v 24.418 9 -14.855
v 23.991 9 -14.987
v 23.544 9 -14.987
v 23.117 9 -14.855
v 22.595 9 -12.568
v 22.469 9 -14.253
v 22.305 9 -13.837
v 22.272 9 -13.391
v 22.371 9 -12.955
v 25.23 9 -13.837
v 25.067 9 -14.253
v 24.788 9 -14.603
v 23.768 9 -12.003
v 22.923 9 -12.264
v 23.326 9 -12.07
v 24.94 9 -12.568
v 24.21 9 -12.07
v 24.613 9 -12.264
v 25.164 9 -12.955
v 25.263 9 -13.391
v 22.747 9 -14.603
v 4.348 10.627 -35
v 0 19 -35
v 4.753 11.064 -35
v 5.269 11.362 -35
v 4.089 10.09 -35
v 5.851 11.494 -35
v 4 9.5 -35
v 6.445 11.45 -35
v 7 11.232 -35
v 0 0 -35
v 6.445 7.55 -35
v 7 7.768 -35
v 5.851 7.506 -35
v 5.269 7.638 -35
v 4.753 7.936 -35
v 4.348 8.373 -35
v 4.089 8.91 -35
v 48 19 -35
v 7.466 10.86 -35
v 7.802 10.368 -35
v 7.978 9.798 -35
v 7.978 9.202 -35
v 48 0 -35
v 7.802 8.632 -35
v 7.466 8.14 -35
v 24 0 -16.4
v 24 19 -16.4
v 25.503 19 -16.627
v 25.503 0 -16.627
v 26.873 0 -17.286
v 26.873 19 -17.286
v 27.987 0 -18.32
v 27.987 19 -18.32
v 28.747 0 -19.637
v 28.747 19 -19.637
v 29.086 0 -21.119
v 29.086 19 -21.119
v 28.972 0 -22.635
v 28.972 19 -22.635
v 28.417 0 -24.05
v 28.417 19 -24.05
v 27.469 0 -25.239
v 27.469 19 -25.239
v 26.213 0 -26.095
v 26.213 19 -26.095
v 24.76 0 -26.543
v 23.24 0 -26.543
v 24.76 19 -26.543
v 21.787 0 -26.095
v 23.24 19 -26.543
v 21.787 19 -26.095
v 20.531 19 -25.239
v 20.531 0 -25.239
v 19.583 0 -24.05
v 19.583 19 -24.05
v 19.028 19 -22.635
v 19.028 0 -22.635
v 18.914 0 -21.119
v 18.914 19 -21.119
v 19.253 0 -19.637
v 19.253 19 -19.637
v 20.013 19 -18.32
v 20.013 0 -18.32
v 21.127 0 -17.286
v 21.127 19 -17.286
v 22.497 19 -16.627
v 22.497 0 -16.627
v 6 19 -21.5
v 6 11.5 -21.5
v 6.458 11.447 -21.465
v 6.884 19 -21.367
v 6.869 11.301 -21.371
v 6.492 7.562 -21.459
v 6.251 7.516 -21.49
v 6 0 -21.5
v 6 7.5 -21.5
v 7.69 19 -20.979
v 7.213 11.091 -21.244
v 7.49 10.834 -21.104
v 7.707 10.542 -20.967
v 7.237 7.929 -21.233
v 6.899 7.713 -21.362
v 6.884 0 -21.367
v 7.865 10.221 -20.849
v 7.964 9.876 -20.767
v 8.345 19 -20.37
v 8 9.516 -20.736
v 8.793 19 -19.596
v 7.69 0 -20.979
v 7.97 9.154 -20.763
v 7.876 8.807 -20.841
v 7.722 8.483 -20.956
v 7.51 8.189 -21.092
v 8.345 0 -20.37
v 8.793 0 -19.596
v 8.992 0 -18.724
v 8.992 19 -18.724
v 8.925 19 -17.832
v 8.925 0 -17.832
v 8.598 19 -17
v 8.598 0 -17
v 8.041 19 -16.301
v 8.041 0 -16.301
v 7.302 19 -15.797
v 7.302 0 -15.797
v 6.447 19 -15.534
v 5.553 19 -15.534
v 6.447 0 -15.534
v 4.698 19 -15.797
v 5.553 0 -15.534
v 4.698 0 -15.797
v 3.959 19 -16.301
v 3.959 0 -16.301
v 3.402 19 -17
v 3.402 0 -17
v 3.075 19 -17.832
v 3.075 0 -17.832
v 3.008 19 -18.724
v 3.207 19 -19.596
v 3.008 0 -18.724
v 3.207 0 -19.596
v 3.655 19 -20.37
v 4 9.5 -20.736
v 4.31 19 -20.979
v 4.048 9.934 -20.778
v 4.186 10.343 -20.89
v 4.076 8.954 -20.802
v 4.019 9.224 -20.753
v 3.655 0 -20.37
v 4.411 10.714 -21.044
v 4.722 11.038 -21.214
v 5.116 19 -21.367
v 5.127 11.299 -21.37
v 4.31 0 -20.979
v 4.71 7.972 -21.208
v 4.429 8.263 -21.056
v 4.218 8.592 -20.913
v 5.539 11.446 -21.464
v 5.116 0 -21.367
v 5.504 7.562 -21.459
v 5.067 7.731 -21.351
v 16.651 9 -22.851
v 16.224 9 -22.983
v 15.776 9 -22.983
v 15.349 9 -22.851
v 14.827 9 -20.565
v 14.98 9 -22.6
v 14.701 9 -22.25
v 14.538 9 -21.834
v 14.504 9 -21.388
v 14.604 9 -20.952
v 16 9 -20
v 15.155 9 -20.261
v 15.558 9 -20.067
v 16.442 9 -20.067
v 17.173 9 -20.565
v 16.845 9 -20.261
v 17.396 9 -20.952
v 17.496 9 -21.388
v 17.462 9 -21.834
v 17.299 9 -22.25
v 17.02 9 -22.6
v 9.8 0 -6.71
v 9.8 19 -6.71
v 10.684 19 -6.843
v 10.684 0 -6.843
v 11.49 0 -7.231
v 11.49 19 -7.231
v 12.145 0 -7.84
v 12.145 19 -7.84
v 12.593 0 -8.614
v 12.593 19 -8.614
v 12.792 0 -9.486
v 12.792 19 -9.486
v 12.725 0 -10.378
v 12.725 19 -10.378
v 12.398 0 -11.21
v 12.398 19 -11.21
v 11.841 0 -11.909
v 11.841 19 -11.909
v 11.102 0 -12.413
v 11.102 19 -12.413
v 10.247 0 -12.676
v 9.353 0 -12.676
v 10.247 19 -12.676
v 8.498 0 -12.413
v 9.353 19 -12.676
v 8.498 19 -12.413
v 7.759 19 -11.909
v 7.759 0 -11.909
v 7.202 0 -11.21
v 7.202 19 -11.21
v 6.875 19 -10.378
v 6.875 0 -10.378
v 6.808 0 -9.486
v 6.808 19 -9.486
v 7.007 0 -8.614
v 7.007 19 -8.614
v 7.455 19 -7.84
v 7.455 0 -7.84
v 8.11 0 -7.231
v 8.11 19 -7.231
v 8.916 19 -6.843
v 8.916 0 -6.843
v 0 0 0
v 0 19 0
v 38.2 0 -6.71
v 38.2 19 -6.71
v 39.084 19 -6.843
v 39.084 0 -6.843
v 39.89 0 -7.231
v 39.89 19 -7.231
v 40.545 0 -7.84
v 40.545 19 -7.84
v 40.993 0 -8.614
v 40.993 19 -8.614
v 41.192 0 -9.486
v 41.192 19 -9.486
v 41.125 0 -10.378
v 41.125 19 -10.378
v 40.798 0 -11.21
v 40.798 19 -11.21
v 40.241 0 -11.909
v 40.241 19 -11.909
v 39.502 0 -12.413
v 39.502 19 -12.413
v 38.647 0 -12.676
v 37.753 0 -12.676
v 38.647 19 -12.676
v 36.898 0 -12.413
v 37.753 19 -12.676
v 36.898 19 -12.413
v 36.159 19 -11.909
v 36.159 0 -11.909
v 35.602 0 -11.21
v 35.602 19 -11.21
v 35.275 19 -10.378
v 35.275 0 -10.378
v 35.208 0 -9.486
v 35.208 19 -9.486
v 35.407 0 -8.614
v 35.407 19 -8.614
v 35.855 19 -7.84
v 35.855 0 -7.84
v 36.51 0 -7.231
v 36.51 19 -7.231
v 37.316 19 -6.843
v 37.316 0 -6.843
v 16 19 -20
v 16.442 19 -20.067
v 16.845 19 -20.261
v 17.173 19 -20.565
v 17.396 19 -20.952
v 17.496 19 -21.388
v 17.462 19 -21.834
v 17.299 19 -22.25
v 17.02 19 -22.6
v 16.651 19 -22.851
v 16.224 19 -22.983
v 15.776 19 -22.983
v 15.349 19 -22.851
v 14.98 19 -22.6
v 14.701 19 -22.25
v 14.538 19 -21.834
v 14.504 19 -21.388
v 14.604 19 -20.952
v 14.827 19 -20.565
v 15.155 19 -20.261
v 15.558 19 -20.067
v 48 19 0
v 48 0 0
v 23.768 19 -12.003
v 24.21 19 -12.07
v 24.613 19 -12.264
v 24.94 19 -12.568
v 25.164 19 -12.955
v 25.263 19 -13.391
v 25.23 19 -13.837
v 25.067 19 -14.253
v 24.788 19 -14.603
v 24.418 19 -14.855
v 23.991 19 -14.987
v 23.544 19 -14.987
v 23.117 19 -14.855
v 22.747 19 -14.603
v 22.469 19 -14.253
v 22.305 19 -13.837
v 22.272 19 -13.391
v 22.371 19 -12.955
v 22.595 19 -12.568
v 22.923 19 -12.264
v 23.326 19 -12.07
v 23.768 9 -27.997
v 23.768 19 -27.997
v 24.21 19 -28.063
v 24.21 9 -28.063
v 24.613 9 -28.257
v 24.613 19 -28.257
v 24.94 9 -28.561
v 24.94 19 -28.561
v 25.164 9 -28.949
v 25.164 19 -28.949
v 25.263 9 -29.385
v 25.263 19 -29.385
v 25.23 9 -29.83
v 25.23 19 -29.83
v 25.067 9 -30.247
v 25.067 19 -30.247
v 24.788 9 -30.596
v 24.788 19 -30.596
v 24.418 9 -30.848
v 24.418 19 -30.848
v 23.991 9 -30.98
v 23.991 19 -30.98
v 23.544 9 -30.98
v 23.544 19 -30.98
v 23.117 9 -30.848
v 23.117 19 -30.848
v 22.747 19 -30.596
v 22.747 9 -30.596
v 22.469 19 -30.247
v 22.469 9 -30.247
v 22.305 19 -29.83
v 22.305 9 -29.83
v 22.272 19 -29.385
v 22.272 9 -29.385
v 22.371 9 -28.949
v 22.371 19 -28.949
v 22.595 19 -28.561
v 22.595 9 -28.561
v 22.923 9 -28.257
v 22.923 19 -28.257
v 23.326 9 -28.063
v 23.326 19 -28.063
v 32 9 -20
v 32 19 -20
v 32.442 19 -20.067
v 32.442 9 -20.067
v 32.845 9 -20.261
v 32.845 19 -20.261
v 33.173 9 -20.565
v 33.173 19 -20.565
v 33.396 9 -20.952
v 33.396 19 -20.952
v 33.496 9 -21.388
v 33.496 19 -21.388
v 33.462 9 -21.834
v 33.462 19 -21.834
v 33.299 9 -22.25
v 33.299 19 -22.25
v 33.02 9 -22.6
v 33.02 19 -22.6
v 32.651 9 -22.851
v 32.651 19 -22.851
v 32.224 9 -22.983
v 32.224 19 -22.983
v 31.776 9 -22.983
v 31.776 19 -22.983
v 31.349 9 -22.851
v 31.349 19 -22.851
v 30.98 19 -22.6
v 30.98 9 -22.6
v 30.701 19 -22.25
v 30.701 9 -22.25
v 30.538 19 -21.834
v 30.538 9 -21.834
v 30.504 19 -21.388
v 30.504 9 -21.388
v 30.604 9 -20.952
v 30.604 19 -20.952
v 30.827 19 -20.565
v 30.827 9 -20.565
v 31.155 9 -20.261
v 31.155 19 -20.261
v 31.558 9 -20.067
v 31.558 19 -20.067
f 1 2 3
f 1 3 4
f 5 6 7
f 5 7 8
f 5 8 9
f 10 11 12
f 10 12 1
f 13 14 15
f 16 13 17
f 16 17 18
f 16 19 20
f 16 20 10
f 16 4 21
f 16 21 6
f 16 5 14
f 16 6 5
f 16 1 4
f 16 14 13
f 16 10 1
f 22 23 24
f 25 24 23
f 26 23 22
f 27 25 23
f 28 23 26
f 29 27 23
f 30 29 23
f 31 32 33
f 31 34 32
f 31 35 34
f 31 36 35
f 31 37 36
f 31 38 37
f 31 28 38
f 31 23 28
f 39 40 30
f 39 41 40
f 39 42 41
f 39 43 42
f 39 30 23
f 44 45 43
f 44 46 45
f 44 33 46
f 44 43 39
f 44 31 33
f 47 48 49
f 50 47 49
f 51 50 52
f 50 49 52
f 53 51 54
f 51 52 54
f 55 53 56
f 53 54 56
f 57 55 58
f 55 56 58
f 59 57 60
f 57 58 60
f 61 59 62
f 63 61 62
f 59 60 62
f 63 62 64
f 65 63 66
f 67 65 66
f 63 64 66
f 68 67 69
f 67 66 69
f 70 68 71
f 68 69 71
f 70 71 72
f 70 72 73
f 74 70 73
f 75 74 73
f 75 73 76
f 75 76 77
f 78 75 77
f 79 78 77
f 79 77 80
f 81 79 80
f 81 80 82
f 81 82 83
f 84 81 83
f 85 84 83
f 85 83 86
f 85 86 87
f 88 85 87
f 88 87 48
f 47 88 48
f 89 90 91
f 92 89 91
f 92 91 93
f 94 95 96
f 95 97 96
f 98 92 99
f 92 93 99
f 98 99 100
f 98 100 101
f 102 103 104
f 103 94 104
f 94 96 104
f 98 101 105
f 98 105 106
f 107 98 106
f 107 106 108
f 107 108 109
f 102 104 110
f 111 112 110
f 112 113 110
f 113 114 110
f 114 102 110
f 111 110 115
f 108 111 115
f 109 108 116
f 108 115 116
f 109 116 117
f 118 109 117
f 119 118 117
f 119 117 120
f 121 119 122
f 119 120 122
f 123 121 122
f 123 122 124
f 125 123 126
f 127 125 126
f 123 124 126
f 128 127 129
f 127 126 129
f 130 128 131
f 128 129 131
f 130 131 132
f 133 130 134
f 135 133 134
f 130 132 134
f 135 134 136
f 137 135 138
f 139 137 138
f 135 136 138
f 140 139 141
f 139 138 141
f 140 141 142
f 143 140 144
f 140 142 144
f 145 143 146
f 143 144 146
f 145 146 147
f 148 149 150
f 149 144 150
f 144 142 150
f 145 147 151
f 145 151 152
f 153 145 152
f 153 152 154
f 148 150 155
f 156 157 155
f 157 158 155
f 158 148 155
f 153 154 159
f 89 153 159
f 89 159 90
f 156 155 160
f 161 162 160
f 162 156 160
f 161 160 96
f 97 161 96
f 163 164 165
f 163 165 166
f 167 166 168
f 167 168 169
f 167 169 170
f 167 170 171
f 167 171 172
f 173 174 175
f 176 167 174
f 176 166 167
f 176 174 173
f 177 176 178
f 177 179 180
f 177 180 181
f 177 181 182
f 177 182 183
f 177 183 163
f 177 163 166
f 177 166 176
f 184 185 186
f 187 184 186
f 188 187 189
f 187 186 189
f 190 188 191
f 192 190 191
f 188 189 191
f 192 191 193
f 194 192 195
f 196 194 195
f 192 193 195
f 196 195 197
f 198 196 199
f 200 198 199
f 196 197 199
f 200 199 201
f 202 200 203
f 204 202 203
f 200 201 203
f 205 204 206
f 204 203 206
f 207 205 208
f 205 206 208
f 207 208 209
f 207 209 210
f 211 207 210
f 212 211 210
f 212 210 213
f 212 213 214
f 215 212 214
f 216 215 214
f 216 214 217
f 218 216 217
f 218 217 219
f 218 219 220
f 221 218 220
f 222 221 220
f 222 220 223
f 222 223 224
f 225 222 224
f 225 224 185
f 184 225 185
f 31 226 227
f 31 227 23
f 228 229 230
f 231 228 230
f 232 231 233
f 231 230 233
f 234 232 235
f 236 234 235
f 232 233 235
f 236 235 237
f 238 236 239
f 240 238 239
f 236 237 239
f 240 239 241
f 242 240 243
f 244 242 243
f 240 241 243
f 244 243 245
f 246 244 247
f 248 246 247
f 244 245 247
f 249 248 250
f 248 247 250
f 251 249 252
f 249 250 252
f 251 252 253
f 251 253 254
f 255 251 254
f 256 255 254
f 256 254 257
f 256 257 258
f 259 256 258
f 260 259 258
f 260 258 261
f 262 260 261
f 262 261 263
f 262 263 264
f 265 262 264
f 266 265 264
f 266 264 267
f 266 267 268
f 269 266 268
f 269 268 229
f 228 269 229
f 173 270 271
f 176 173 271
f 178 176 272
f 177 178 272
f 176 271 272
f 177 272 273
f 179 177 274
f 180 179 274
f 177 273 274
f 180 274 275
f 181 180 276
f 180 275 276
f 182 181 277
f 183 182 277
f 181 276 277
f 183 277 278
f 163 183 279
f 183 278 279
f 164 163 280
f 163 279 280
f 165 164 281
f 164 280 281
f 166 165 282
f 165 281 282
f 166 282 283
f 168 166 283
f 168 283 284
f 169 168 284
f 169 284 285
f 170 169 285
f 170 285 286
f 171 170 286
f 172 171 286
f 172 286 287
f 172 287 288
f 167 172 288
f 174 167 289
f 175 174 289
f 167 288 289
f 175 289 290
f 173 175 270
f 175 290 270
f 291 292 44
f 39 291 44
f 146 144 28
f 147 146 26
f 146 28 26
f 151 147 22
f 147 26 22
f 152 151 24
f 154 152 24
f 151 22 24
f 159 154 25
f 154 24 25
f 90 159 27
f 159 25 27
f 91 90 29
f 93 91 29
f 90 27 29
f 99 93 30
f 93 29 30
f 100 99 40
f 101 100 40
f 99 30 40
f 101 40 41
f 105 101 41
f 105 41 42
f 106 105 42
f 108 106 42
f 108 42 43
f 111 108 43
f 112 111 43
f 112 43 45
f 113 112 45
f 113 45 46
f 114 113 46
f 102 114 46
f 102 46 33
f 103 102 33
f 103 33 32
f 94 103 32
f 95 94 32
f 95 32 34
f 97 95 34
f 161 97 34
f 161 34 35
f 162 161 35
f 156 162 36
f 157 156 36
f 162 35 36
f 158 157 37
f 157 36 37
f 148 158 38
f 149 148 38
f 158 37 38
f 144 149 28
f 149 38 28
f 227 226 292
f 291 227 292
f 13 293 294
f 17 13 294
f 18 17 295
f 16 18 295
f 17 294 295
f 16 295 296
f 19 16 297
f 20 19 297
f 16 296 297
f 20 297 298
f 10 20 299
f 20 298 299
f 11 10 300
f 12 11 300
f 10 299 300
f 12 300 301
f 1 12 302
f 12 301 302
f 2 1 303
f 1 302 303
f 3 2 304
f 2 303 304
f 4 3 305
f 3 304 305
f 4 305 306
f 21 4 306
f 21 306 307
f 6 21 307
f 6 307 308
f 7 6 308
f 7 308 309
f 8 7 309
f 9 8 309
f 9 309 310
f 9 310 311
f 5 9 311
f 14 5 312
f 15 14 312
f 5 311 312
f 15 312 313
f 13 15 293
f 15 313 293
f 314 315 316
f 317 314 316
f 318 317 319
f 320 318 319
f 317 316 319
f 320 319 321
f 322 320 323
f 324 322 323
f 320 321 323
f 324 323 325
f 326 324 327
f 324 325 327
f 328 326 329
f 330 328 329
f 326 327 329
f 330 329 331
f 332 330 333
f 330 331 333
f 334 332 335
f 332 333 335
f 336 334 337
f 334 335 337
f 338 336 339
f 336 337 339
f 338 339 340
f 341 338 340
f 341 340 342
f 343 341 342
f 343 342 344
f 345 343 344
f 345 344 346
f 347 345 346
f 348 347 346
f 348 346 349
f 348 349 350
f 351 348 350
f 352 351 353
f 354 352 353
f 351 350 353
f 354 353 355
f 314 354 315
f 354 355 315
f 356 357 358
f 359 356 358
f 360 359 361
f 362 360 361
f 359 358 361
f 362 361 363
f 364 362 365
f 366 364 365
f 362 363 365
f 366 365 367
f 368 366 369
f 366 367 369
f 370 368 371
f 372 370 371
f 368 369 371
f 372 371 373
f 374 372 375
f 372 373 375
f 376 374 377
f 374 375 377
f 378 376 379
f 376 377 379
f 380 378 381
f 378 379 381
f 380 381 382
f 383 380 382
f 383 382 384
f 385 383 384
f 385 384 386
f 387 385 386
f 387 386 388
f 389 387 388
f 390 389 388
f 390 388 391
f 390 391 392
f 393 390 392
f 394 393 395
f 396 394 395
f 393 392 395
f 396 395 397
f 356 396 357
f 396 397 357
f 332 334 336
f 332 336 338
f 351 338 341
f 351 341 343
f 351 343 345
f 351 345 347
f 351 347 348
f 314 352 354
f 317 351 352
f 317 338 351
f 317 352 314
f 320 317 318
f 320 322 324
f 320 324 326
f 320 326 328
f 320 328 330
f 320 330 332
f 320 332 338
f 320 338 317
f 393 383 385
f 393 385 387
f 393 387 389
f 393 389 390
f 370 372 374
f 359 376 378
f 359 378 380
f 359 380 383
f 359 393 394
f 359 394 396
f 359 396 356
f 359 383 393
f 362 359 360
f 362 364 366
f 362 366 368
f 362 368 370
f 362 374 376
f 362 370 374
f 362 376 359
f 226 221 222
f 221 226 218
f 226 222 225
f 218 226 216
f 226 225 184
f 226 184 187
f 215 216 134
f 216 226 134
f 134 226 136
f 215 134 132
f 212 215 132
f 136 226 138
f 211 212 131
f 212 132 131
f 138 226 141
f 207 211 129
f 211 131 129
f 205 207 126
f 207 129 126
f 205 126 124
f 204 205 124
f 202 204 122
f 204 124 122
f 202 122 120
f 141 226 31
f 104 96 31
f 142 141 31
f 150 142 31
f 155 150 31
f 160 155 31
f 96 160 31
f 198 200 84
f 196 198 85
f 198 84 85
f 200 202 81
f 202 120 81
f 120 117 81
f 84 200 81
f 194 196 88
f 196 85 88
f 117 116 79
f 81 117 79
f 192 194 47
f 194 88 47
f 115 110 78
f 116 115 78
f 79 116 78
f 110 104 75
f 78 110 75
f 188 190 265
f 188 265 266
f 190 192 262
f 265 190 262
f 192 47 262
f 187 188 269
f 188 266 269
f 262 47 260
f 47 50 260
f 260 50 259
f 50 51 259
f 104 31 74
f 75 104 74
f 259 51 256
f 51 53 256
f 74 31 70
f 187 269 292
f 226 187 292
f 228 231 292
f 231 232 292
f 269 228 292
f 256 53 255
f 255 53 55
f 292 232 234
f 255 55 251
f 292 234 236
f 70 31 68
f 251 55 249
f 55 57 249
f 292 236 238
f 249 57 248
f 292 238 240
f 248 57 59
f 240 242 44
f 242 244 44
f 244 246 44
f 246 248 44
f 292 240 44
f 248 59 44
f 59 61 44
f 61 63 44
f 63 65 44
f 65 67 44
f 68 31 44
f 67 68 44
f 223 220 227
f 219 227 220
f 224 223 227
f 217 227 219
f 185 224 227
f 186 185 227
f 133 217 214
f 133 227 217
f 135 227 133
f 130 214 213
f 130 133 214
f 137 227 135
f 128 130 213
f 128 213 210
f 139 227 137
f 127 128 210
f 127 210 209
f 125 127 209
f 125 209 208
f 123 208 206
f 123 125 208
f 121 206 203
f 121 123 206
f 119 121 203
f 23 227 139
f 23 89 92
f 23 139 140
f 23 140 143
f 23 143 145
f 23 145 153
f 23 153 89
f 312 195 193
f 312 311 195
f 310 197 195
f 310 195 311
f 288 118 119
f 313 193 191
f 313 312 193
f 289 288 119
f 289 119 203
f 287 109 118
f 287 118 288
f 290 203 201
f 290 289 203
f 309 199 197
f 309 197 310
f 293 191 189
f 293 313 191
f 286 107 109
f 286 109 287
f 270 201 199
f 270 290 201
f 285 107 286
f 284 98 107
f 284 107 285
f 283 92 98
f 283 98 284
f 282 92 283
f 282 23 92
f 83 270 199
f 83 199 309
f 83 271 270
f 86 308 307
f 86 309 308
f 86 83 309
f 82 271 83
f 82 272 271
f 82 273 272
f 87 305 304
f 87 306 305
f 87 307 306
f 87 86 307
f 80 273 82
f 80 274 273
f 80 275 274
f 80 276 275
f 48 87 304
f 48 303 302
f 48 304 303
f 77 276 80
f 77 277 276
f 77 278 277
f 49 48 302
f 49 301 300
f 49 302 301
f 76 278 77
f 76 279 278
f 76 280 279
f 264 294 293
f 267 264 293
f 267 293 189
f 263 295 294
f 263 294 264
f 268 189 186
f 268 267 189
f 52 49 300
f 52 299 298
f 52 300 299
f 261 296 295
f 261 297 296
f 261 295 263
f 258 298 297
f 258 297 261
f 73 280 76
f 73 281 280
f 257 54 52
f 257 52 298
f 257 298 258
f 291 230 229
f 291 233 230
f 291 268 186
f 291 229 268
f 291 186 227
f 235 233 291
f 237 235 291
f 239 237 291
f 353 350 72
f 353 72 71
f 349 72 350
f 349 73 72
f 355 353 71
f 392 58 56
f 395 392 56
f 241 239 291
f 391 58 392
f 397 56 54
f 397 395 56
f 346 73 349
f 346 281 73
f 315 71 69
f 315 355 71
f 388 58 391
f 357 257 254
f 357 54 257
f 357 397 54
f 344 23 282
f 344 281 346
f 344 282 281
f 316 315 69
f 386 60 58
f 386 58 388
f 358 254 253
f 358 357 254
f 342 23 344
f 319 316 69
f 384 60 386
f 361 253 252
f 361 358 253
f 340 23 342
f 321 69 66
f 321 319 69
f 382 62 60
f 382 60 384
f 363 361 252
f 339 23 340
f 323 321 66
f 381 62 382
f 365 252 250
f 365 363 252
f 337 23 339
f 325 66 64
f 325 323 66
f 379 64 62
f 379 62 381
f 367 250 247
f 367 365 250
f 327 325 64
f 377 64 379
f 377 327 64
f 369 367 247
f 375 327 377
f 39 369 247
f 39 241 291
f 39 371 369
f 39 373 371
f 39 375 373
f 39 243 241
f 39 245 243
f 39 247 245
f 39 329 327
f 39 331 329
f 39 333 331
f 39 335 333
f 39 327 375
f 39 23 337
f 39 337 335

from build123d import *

# Parameters (mm, degrees)
ESBO_O1_W                = 48
ESBO_O1_H                = 35
RESSALTO_EXTRUS_O1_DEPTH = 19
ESBO_O4_R                = 5.1
CORTE_EXTRUS_O3_DEPTH    = 25
ESBO_O7_R                = 3
CORTE_EXTRUS_O7_DEPTH    = 63.369864518
ESBO_O8_R                = 3
CORTE_EXTRUS_O8_DEPTH    = 63.369864518
ESBO_O9_R                = 2
CORTE_EXTRUS_O9_DEPTH    = 17
ESBO_O6_R                = 1.5
CORTE_EXTRUS_O10_DEPTH   = 10


with BuildPart() as part:
    # Esboço1 → Ressalto-extrusão1 (new body)
    with BuildSketch(Plane(origin=(0, 0, 0), x_dir=(1, 0, 0), z_dir=(0, 1, 0))):
        with Locations((24, 17.5)):
            Rectangle(ESBO_O1_W, ESBO_O1_H)
    extrude(amount=RESSALTO_EXTRUS_O1_DEPTH)

    # Esboço4 → Corte-extrusão3 (cut)
    with BuildSketch(Plane(origin=(0, 19, 0), x_dir=(1, 0, 0), z_dir=(0, 1, 0))):
        with Locations(Location((24, 21.5, 0), (0, 0, 270))):
            Circle(ESBO_O4_R)
    extrude(amount=-CORTE_EXTRUS_O3_DEPTH, mode=Mode.SUBTRACT)

    # Esboço7 → Corte-extrusão7 (cut, through all)
    with BuildSketch(Plane(origin=(0, 19, 0), x_dir=(1, 0, 0), z_dir=(0, 1, 0))):
        with Locations(Location((9.8, 9.71, 0), (0, 0, 270))):
            Circle(ESBO_O7_R)
        with Locations(Location((38.2, 9.71, 0), (0, 0, 270))):
            Circle(ESBO_O7_R)
    extrude(amount=-CORTE_EXTRUS_O7_DEPTH, mode=Mode.SUBTRACT)

    # Esboço8 → Corte-extrusão8 (cut, through all)
    with BuildSketch(Plane.XZ):
        with Locations(Location((6, -18.5, 0), (0, 0, 270))):
            Circle(ESBO_O8_R)
    extrude(amount=-CORTE_EXTRUS_O8_DEPTH, mode=Mode.SUBTRACT)

    # Esboço9 → Corte-extrusão9 (cut)
    with BuildSketch(Plane(origin=(0, 0, -35), x_dir=(-1, 0, 0), z_dir=(0, 0, -1))):
        with Locations((-6, 9.5)):
            Circle(ESBO_O9_R)
    extrude(amount=-CORTE_EXTRUS_O9_DEPTH, mode=Mode.SUBTRACT)

    # Esboço6 → Corte-extrusão10 (cut)
    with BuildSketch(Plane(origin=(0, 19, 0), x_dir=(1, 0, 0), z_dir=(0, 1, 0))):
        with Locations(Location((23.767635295, 29.496624703, 0), (0, 0, 270))):
            Circle(ESBO_O6_R)
        with Locations(Location((16, 21.5, 0), (0, 0, 270))):
            Circle(ESBO_O6_R)
        with Locations(Location((32, 21.5, 0), (0, 0, 270))):
            Circle(ESBO_O6_R)
        with Locations(Location((23.767635295, 13.503375297, 0), (0, 0, 270))):
            Circle(ESBO_O6_R)
    extrude(amount=-CORTE_EXTRUS_O10_DEPTH, mode=Mode.SUBTRACT)


solid = part.part
